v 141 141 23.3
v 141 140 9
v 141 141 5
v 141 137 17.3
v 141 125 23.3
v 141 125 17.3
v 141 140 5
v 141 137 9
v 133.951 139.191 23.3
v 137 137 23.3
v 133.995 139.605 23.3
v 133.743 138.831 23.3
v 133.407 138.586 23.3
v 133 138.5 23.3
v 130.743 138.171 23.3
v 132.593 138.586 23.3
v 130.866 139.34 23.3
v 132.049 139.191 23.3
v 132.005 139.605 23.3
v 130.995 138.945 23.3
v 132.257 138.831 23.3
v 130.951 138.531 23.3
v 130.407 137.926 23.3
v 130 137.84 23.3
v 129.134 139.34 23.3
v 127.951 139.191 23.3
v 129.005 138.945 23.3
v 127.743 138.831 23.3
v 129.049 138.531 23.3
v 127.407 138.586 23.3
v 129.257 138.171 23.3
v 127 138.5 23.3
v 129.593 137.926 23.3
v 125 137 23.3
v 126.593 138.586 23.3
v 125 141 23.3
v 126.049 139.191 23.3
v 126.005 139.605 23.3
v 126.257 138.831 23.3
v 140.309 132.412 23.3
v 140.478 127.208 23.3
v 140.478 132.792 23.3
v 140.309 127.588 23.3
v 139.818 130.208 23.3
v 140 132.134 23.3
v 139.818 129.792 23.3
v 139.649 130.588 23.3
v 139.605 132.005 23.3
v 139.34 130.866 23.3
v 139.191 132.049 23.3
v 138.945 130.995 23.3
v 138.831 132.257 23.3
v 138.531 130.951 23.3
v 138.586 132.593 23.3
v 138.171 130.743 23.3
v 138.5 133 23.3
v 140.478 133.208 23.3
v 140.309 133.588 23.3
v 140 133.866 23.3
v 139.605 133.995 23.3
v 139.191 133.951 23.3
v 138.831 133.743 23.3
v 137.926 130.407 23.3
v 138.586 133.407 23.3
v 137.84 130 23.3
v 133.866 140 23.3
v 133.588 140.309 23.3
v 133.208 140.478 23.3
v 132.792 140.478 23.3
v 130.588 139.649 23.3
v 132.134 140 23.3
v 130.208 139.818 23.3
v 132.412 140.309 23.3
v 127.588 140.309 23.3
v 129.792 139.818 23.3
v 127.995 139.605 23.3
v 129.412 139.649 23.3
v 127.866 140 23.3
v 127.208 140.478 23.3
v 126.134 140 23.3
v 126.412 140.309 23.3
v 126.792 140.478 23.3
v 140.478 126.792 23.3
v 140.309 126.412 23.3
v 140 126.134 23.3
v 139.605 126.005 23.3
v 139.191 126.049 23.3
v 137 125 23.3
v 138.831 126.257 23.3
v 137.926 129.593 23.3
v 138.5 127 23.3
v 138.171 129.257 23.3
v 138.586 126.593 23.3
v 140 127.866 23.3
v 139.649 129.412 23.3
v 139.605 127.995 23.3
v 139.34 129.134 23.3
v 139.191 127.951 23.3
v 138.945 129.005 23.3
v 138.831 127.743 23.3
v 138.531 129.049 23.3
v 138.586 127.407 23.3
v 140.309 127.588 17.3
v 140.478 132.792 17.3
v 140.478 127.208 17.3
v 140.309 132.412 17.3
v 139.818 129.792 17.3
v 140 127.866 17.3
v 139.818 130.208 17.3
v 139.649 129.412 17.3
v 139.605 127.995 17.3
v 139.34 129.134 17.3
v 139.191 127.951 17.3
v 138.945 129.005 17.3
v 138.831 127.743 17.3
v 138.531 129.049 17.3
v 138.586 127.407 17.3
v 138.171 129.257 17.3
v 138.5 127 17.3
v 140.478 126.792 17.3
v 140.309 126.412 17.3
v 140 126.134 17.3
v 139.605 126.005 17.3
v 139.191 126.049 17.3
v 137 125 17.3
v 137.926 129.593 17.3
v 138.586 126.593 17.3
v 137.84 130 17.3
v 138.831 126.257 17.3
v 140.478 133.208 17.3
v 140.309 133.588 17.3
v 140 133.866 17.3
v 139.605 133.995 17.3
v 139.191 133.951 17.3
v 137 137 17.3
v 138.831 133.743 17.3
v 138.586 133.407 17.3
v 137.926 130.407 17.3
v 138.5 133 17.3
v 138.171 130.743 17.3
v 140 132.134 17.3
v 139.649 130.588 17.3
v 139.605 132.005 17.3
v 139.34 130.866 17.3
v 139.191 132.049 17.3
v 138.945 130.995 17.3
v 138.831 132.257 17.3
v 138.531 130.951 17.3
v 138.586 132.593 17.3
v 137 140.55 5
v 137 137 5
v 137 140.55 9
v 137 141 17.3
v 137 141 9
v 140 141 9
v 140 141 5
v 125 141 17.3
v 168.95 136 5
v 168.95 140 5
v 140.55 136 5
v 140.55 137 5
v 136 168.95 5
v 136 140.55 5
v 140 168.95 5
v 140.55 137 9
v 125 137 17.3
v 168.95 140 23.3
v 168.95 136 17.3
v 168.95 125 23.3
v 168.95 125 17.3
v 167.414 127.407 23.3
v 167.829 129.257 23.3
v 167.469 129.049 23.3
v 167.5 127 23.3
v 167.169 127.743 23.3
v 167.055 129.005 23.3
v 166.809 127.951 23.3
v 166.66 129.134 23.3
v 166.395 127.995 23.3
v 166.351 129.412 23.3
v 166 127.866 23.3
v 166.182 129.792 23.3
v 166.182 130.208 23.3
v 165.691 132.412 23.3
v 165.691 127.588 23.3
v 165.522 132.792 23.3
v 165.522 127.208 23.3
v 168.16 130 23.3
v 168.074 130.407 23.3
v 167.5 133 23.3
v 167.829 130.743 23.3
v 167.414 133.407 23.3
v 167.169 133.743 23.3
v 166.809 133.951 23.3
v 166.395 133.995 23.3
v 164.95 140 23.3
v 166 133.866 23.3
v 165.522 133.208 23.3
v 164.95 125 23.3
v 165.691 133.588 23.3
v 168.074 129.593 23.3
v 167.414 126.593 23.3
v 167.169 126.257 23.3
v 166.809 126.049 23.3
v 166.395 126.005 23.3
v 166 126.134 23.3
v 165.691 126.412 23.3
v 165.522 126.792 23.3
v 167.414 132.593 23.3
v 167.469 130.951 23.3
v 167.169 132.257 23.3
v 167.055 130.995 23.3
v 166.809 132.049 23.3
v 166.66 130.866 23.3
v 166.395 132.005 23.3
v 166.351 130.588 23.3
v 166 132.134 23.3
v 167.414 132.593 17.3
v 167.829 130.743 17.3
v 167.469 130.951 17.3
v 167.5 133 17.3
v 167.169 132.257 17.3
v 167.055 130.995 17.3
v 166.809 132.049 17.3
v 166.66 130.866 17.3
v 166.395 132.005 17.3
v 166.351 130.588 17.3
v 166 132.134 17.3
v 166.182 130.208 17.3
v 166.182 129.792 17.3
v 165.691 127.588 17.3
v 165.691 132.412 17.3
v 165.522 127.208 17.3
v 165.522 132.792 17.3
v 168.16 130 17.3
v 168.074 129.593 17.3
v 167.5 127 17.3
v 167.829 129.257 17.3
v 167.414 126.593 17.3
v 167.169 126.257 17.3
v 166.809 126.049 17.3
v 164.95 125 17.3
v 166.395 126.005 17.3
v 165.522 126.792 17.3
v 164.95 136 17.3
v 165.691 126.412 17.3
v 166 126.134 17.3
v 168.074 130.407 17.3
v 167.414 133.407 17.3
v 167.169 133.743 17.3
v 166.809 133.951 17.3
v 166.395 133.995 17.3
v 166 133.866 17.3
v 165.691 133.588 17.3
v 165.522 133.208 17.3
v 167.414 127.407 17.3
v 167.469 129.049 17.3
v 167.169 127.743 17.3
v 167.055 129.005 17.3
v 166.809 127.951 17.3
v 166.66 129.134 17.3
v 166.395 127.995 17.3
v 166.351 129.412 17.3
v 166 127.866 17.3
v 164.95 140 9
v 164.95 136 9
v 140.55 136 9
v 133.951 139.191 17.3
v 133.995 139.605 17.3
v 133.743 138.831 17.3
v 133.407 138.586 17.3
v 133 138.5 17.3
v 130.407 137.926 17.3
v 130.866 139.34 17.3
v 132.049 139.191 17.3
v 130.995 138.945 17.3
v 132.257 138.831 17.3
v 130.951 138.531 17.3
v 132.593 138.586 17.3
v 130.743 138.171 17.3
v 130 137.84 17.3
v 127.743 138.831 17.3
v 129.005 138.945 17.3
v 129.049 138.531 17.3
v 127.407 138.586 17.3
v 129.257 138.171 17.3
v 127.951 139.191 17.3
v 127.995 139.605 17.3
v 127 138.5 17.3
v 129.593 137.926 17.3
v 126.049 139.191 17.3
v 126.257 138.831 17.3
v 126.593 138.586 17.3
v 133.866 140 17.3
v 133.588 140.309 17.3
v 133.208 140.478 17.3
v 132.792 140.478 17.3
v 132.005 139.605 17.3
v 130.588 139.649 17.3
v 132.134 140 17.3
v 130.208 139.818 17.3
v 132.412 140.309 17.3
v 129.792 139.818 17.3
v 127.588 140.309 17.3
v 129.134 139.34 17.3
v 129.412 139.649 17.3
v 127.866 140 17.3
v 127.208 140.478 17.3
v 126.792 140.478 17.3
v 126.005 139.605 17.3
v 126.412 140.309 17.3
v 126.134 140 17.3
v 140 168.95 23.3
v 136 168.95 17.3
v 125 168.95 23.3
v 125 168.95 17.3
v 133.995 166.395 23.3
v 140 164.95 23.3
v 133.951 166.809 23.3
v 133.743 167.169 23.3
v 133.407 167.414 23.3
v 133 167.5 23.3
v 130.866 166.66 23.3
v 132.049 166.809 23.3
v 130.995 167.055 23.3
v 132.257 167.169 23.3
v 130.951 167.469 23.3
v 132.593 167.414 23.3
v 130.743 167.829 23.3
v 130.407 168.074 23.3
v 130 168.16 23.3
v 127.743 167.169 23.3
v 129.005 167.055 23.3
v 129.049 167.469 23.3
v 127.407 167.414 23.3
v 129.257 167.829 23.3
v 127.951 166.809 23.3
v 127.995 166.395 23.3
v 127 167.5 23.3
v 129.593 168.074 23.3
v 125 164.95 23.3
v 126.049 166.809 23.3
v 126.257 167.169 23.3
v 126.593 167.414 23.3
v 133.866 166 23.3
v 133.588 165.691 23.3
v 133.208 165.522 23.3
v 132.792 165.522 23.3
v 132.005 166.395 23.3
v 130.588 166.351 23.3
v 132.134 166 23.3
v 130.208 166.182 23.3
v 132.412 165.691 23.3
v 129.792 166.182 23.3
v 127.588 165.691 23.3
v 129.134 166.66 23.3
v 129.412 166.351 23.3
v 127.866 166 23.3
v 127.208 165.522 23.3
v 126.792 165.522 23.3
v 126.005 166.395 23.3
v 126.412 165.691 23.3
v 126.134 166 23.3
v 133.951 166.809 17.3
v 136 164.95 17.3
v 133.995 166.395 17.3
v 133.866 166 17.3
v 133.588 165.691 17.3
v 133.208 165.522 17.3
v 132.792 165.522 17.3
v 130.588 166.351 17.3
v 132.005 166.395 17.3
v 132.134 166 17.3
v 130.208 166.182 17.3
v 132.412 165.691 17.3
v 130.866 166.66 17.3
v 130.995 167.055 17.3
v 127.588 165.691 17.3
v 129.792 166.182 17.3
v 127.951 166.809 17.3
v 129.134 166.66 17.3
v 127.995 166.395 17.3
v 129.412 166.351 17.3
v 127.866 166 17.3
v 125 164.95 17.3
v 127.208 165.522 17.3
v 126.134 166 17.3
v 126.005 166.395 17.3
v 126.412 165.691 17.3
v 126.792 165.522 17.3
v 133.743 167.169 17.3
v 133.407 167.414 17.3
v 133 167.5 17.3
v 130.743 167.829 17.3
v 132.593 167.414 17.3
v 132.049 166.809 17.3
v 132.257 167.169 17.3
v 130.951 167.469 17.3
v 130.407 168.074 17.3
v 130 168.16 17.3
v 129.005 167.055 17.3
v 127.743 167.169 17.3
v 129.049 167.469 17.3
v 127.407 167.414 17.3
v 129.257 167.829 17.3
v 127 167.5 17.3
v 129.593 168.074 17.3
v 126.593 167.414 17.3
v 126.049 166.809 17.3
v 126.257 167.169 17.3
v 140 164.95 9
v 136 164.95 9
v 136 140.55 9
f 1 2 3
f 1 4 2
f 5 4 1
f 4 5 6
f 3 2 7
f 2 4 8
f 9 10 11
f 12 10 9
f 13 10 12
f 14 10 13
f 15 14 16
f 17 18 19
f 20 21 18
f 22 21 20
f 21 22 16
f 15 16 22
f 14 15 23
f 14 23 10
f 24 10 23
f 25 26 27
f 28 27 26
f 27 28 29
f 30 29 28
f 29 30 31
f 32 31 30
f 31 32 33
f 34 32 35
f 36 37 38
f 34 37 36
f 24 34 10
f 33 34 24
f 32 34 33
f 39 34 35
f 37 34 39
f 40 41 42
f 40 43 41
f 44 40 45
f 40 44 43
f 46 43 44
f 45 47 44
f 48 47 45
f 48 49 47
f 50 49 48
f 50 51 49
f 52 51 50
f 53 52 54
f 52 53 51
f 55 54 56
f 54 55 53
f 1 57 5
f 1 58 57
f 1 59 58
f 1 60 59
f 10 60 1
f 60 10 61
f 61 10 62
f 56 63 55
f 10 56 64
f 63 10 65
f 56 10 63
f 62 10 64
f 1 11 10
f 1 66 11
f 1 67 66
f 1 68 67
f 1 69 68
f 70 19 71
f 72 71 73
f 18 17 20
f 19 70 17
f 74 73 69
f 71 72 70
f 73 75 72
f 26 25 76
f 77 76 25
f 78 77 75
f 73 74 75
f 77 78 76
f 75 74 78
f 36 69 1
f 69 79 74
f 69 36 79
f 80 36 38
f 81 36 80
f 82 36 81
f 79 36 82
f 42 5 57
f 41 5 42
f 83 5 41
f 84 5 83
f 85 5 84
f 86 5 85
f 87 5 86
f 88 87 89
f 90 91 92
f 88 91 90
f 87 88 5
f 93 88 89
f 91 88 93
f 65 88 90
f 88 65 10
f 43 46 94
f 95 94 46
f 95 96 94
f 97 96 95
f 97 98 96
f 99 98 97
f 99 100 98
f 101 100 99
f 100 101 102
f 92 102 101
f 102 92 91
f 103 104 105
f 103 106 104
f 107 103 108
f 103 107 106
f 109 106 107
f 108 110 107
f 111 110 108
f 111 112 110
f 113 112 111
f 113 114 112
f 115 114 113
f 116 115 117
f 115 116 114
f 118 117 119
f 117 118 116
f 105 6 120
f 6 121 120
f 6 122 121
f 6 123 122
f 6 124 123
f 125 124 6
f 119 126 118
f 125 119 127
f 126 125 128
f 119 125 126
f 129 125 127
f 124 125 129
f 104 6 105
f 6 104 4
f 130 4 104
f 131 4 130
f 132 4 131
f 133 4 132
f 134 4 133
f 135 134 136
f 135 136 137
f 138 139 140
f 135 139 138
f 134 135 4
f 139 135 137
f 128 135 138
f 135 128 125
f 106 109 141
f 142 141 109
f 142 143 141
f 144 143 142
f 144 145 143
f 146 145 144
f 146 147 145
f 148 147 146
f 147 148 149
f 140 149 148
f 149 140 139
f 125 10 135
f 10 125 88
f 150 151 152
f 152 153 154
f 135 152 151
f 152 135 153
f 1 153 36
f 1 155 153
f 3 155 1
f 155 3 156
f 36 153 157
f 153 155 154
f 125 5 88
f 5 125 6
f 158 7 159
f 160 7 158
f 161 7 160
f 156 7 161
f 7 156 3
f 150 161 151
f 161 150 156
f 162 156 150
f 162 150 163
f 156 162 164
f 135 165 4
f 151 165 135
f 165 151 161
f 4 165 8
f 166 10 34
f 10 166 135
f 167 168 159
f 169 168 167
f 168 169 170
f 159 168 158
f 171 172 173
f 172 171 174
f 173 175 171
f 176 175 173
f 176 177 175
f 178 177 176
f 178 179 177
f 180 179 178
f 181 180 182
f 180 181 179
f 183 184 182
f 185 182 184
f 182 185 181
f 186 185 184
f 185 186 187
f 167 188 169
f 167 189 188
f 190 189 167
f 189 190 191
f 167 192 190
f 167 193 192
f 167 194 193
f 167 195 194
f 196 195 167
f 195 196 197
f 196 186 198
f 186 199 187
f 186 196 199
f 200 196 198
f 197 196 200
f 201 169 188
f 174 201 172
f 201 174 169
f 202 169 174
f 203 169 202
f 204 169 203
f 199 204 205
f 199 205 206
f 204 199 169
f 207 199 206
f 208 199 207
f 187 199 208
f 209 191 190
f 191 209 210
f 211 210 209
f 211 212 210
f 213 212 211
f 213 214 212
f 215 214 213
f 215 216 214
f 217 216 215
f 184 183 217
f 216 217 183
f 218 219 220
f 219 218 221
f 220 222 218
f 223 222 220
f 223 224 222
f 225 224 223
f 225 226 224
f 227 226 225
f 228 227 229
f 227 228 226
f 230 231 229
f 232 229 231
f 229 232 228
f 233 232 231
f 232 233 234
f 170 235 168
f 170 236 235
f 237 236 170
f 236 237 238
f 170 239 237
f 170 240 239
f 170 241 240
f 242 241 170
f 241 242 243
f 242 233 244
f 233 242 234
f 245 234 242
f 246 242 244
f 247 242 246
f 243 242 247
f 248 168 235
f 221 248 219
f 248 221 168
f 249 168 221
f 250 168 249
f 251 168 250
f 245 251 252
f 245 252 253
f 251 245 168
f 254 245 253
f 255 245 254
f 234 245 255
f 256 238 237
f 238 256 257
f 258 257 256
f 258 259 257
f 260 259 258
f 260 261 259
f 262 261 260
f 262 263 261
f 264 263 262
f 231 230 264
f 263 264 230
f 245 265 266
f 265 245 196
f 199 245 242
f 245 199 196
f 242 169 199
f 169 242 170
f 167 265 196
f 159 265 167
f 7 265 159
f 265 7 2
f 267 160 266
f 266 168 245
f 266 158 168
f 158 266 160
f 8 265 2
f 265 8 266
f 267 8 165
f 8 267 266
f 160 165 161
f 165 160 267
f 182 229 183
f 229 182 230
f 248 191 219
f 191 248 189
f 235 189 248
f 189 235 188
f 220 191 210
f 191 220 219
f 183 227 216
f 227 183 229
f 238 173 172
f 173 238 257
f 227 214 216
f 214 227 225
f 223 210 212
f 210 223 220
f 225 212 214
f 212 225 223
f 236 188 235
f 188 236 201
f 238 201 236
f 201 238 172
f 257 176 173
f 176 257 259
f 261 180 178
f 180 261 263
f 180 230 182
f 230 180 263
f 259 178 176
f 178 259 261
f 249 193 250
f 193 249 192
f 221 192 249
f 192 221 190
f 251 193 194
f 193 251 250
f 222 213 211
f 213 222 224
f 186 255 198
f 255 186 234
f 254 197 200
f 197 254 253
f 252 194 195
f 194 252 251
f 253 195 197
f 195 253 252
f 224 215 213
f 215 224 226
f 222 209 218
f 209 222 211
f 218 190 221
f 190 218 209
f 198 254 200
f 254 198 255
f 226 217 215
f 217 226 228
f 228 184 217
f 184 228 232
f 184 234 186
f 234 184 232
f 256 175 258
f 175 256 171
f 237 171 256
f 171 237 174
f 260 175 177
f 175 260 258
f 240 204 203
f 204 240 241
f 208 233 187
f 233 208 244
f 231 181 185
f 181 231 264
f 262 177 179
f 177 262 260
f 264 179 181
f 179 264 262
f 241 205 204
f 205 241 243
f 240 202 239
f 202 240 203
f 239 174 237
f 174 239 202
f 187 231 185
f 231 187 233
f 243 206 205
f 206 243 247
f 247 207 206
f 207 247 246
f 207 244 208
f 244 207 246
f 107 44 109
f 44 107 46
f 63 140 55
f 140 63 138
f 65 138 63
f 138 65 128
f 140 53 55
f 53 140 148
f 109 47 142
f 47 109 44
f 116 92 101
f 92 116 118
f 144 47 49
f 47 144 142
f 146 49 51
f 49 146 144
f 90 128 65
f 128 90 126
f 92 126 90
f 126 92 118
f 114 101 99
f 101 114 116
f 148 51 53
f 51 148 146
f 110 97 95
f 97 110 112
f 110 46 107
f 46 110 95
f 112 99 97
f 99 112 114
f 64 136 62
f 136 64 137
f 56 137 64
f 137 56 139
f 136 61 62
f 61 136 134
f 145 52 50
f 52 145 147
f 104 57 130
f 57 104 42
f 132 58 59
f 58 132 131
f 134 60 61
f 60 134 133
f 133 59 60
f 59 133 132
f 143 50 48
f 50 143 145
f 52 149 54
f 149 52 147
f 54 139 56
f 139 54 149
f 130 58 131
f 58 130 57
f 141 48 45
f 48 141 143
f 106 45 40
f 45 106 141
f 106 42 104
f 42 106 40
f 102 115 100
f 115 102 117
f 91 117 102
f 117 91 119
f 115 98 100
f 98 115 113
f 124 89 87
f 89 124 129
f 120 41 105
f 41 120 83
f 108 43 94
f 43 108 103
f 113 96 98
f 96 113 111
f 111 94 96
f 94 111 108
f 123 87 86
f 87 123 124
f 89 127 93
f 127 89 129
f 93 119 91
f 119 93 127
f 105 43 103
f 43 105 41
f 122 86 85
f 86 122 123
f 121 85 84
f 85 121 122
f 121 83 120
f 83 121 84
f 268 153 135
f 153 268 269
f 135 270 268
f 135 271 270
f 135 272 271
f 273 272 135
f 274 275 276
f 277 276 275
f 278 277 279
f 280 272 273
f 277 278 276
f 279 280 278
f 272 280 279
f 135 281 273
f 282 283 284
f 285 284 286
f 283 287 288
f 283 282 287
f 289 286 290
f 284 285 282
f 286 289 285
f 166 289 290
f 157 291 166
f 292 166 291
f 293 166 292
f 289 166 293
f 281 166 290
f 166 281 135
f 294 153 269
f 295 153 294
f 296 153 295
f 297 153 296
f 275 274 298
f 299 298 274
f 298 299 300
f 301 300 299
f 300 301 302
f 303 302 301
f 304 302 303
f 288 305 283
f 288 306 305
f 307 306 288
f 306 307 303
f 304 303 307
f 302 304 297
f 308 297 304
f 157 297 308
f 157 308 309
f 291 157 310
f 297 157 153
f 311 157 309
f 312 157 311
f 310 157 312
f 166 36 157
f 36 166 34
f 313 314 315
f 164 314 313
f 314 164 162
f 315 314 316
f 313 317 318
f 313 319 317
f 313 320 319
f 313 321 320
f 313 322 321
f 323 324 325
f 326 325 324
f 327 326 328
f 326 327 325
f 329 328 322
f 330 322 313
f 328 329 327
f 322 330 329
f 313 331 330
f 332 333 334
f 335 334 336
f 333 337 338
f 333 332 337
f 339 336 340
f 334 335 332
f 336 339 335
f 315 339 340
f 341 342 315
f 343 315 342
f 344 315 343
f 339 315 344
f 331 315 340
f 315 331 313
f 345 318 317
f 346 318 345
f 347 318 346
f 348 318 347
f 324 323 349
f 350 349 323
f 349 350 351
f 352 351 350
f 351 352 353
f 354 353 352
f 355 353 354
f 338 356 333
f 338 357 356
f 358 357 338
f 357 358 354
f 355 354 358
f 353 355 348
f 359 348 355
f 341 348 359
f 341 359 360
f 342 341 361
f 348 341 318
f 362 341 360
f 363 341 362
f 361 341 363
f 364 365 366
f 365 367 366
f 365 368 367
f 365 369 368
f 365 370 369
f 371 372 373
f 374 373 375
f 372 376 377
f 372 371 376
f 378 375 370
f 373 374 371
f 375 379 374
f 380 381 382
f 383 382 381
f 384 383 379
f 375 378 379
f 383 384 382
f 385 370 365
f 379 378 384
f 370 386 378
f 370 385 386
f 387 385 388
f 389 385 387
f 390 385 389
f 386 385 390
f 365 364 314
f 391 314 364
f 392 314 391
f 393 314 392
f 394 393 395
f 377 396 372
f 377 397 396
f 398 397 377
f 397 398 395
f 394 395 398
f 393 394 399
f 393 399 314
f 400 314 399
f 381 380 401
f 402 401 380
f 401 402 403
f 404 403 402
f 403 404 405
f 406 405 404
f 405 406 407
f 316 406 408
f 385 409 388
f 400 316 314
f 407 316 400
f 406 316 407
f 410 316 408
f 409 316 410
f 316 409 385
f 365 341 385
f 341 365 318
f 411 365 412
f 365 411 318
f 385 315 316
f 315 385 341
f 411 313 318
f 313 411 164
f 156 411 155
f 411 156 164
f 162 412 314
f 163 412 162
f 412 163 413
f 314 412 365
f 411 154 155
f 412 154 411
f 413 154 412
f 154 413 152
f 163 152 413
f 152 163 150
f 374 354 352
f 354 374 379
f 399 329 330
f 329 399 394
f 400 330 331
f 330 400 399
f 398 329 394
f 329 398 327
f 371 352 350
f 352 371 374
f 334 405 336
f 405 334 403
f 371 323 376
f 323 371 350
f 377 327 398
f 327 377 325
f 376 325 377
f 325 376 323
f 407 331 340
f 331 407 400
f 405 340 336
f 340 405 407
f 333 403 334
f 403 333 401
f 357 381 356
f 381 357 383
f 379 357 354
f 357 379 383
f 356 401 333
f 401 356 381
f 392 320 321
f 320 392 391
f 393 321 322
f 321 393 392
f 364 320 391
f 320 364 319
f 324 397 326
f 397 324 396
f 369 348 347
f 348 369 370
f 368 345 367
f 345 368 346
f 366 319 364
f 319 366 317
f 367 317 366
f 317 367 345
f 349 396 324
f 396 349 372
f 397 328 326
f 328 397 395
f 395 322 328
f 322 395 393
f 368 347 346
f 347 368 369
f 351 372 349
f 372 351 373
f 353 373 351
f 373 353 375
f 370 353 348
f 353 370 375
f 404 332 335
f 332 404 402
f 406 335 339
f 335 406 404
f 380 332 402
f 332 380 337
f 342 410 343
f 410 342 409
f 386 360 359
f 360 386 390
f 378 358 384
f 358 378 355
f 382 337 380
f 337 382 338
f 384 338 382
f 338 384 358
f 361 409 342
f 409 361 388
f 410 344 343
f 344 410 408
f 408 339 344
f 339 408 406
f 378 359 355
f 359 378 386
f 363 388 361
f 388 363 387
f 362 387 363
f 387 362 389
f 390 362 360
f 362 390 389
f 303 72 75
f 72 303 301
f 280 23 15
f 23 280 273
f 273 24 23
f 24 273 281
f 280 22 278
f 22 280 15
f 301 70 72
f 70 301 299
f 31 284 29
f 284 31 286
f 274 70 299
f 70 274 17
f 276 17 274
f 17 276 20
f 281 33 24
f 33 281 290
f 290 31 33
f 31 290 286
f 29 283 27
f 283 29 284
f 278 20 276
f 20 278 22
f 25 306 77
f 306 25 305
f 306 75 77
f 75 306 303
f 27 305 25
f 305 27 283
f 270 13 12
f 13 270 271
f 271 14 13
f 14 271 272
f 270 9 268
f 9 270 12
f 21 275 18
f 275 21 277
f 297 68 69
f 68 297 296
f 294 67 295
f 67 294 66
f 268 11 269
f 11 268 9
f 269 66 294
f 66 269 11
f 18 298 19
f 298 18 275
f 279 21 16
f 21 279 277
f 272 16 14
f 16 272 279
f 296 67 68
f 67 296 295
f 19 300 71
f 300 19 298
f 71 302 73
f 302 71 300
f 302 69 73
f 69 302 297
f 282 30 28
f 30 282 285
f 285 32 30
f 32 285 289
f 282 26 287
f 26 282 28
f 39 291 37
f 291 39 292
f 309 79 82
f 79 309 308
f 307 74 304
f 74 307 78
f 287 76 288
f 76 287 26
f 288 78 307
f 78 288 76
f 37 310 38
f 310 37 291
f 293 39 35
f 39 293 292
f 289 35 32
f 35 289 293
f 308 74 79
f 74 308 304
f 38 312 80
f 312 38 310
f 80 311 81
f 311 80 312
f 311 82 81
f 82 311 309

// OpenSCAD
// file: ../motors/MN5212.scad
use <../utils.scad>

module MN5212(){

	//render(){
		difference(){
			union(){
				translate([0,0, 42.5 / 2 - 23 / 2 - 4.9 - 6])
					cylinder(
						h = 23,
						r = 59 / 2,
						$fa = fa(59 / 2),
						center = true);
				translate([0,0, 42.5 / 2 - 4.9 / 2 - 6])
					cylinder(
						h = 4.9,
						r1 = 59 / 2,
						r2 = 24.8 / 2,
						$fa = fa(59 / 2),
						center = true);
				translate([0,0, - 42.5 / 2 + 5.6 / 2 + 3])
					cylinder(
						h = 5.6,
						r1 = 44 / 2,
						r2 = 59 / 2,
						$fa = fa(59 / 2),
						center = true);
				translate([0, 0, 42.5 / 2 - 3])
					cylinder(
						h = 6,
						r = 4 / 2,
						$fa = fa(4 / 2),
						center = true);
				translate([0, 0, - 42.5 / 2 + 1.5])
					cylinder(
						h = 3,
						r = 6 / 2,
						$fa = fa(6 / 2),
						center = true);
			}
			union(){
				for(i = [0:90:270])
					rotate([0, 0, i])
						translate([0, 25 / 2, -16.25 - 0.025])
							cylinder(
								h = 4,
								r = 3 / 2,
								$fa = fa(3 / 2),
								center = true);
				for(i = [0:120:240])
					rotate([0, 0, i])
						translate([0, 17 / 2, 12.75 + 0.025])
							cylinder(
								h = 5,
								r = 3 / 2,
								$fa = fa(3 / 2),
								center = true);
				rotate([0, 0, 30])
					translate([0, 12 / 2, 12.75 + 0.025])
						cylinder(
							h = 5,
							r = 3 / 2,
							$fa = fa(3 / 2),
							center = true);
				rotate([0, 0, 30 + 180])
					translate([0, 12 / 2, 12.75 + 0.025])
						cylinder(
							h = 5,
							r = 3 / 2,
							$fa = fa(3 / 2),
							center = true);
			}
		}

	//}

}

MN5212();
// file: ../servos/TGY_4805_2PA.scad
use <../utils.scad>

module TGY_4805_2PA(){

	length = 40;
	width = 20;
	depth = 36.4;
	wing_width = 58;
	wing_thick = 2.45;
	wing_height = 27.7;
	shaft_offset = 9.5;
	hole_seperation = 9.2;
	hole_spacing = 50;
	shaft_height = 40;
	shaft_length = 3.6;
	hole_diameter = 4.8;

	module mounting_hole(){
		mh_rad = hole_diameter / 2;
		translate(
			[
				hole_spacing / 2,
				0,
				-depth / 2 + wing_height - wing_thick / 2
			])
			cylinder(h = 5, r = mh_rad, $fa = fa(mh_rad), center = true);
	}

	difference(){
		union(){
			cube([length, width, depth], center = true);
			translate([0, 0, -depth / 2 + wing_height - wing_thick / 2])
				cube([wing_width, width, wing_thick], center = true);
			translate(
				[
					- length / 2 + shaft_offset,
					0,
					shaft_height - length / 2 + shaft_length / 2
				])
				cylinder(
					h = shaft_length,
					r = 1.5,
					$fa = fa(1.5),
					center = true);
		}	union(){

			translate([0, hole_seperation / 2, 0]){
				mounting_hole();
				mirror() mounting_hole();
			}
			translate([0, -hole_seperation / 2, 0]){
				mounting_hole();
				mirror() mounting_hole();
			}
		}
	}
}

module TGY_4805_2PA_translate(){
	length = 40;
	shaft_offset = 9.5;
	shaft_height = 40;
	shaft_length = 3.6;
	translate(
		[
				- length / 2 + shaft_offset,
				0,
				shaft_height - length / 2 + shaft_length / 2
		]) children();
}

TGY_4805_2PA();
// file: ../servos/HS_5065MG.scad
use <../utils.scad>

module HS_5065MG(){

	length = 23.75;
	width = 11.68;
	depth = 20.32;
	wing_width = 32.38;
	wing_thick = 2;
	wing_offset = 1;
	shaft_offset = 6;
	hole_spacing = 28.32;
	hole_spacing_2 = 27;
	hole_2_wide = 6;
	hole_diameter = 2;
	shaft_height = 26.16;
	shaft_length = 2;

	module mounting_hole(){
		mh_rad = hole_diameter / 2;
		translate(
			[
				hole_spacing / 2,
				0,
				depth / 2 - wing_thick / 2
			])
			cylinder(h = 5, r = mh_rad, $fa = fa(mh_rad), center = true);
		translate(
			[
				hole_spacing_2 / 2,
				hole_2_wide / 2,
				depth / 2 - wing_thick / 2
			])
			cylinder(h = 5, r = mh_rad, $fa = fa(mh_rad), center = true);
		translate(
			[
				hole_spacing_2 / 2,
				- hole_2_wide / 2,
				depth / 2 - wing_thick / 2
			])
			cylinder(h = 5, r = mh_rad, $fa = fa(mh_rad), center = true);
	}

	difference(){
		union(){
			cube([length, width, depth], center = true);
			translate([0, 0, depth / 2 - wing_thick / 2 - wing_offset])
				cube([wing_width, width, wing_thick], center = true);
			translate(
				[
					- length / 2 + shaft_offset,
					0,
					depth / 2 + 3.8 + 1.9 + shaft_length / 2
				])
				cylinder(
					h = shaft_length,
					r = 1.5,
					$fa = fa(1.5),
					center = true);
			translate(
				[
					- length / 2 + shaft_offset,
					0,
					depth / 2 + 3.8 / 2
				])
				cylinder(
					h = 3.8,
					r = 11.3 / 2,
					$fa = fa(11.3 / 2),
					center = true);
			translate(
				[
					- length / 2 + shaft_offset,
					0,
					depth / 2 + 3.8 + 1.9 / 2
				])
				cylinder(
					h = 1.9,
					r1 = 11.3 / 2,
					r2 = 8 / 2,
					$fa = fa(11.3 / 2),
					center = true);
		}	union(){

			mounting_hole();
			mirror() mounting_hole();
		}
	}
}

module HS_5065MG_arm(){

	hole_size = 1.5;
	hole_spacing = 3;
	hole_offset = 9.6;

	difference(){
		union(){
			translate([0, 0, 4.4 / 2])
				cylinder(
					h = 4.4,
					r = 8 / 2,
					$fa = fa(8 / 2),
					center = true);
			hull(){
				translate([0, 0, 4.4 - 1.8 / 2])
					cylinder(
						h = 1.8,
						r = 8 / 2,
						$fa = fa(8 / 2),
						center = true);
				translate([18.8, 0, 4.4 - 1.8 / 2])
					cylinder(
						h = 1.8,
						r = 5 / 2,
						$fa = fa(5 / 2),
						center = true);
			}
		}
		union(){
			for(i = [0:3]){
				translate([hole_offset + hole_spacing * i, 0, 4.4 - 1.8 / 2])
					cylinder(
						h = 5,
						r = hole_size / 2,
						$fa = fa(hole_size / 2),
						center = true);
			}
		}
	}
}

module HS_5065MG_shaft_translate(){
	translate(
		[
			- 23.75 / 2 + 6,
			0,
			20.32 / 2 + 3.8 + 1.9
		])
			children();
}

HS_5065MG();
HS_5065MG_shaft_translate() HS_5065MG_arm();
// file: ../servos/LS_0006_servo.scad
// Author Michael Marques (DrYerzinia)

use <../utils.scad>

module ls_0006_servo(){
	
	length = 21.4;
	depth = 19.9;
	thickness = 11.65;

	gear_height = 2.6;
	gear_bump_height = 0.7;
	gear_bump_diameter = 1.97;
	gear_outer_bump_diameter = 6;
	gear_bump_offset = 12.2;

	shaft_height = 2.4;
	shaft_diameter = 3.74;
	shaft_offset = thickness / 2;
	shaft_screw_diameter = 1.3;
	
	wing_outer_width = 8.5;
	wing_top_off = 3.8;
	wing_length = 3.8;
	wing_thickness = 1.2;
	wing_hole_diameter = 1.85;
	wing_hole_edge_dist = 2;

	module wing_hole(){
		translate(
			[
				length / 2 + wing_hole_edge_dist,
				0,
				depth/2 - wing_top_off - wing_thickness / 2
			])
			cylinder(
				h = wing_thickness + 1,
				r = wing_hole_diameter / 2,
				$fn = 16,
				center = true);
	}

	module wing(){
		translate(
			[
				length / 2,
				thickness / 2,
				depth/2 - wing_top_off - wing_thickness
			])
			rotate([0,0,-90])
				trapezoid(
					thickness,
					wing_outer_width,
					wing_length,
					wing_thickness);
	}

	// Body
	cube([length, thickness, depth], center = true);

	difference(){
		union(){

			wing();
			mirror() wing();

			// Gear Bumps
			translate([0, 0, depth/2 + gear_height / 2]){
				translate([length / 2 - gear_bump_offset, 0, 0])
					cylinder(
						h = gear_height,
						r = gear_outer_bump_diameter / 2,
						$fn = 16,
						center = true);
				translate([length / 2 - gear_bump_offset, 0, gear_height/2 + gear_bump_height / 2])
					cylinder(
						h = gear_bump_height,
						r = gear_bump_diameter / 2,
						$fn = 16,
						center = true);
				translate([length / 2 - shaft_offset, 0, 0])
					cylinder(
						h = gear_height,
						r = thickness / 2,
						$fn = 32,
						center = true);
				// Shaft
				translate([length / 2 - shaft_offset, 0, gear_height])
					cylinder(
						h = shaft_height,
						r = shaft_diameter / 2,
						$fn = 16,
						center = true);
			}

		}
		union(){

			wing_hole();
			mirror() wing_hole();

			// Shaft_hole
			translate(
				[
					length / 2 - shaft_offset,
					0,
					depth/2 + gear_height * (3 / 2) + 0.5])
				cylinder(
					h = shaft_height + 1,
					r = shaft_screw_diameter / 2,
					$fn = 16,
					center = true);

		}
	}

}

module translate_ls_0006_attachment(){

	length = 21.4;
	thickness = 11.65;
	shaft_offset = thickness / 2;
	depth = 19.9;
	float = 3.3;

	translate([length / 2 - shaft_offset, 0, depth / 2 + float])
		children();

}

module bar_attachment(){

	height = 3.75;
	bar_length = 14.7;
	bar_thickness = 1.6;
	inner_radius = 5.9;
	outer_radius = 3.95;
	shaft_diameter = 3.7;
	upper_void_diameter = 4.8;
	screw_diameter = 2;
	hole_spacing = 2;
	hole_4_diameter = 1.2;
	hole_diameter = 1;
	hole_start_off = 4.7;
	top_void_depth = 0.67;
	bottom_void_depth = 1.84;

	translate([0, 0, height / 2]){
		difference(){
			union(){

				translate([0, inner_radius / 2, height / 2 - bar_thickness])
					rotate([0,0,-90])
						trapezoid(
							inner_radius,
							outer_radius,
							bar_length,
							bar_thickness);

				cylinder(
					h = height,
					r = inner_radius / 2,
					$fn = 16,
					center = true);

				translate([bar_length, 0, height / 2 - bar_thickness / 2])
					cylinder(
						h = bar_thickness,
						r = outer_radius / 2,
						$fn = 16,
						center = true);

			}
			union(){
				// screwhole
				cylinder(
					h = height + 1,
					r = screw_diameter / 2,
					$fn = 16,
					center = true);
				// voids
				translate([0, 0, height / 2 - top_void_depth / 2 + 0.5])
					cylinder(
						h = top_void_depth + 1,
						r = upper_void_diameter / 2,
						$fn = 16,
						center = true);
				translate([0, 0,  - bottom_void_depth / 2 - 0.5])
					cylinder(
						h = bottom_void_depth + 1,
						r = shaft_diameter / 2,
						$fn = 16,
						center = true);

				for(i = [0:4]){
					dia = (i != 3) ? hole_diameter : hole_4_diameter;
					translate(
						[
							hole_start_off + hole_spacing * i,
							0,
							height / 2 - bar_thickness / 2])
						cylinder(
							h = bar_thickness + 1,
							r = dia / 2,
							$fn = 16,
							center = true);
				}

			}
		}
	}

}

ls_0006_servo();
translate_ls_0006_attachment() bar_attachment();
// file: ../servos/parallax_continuous_rotation_servo.scad
// Author Michael Marques (DrYerzinia)

module parallax_continuous_rotation_servo(){

	depth = 37.7;
	length = 40.75;
	width = 19.75;

	mount_height = 2.7;
	mount_extent = 6.1;
	mount_from_top = 7.7;

	mount_hole_diameter = 4.46;
	mount_hole_spacing = 14.4 - mount_hole_diameter;

	shaft_diameter = 5.8;
	shaft_offset = 10;
	shaft_length = 3.5;

	module mounting_hole(){

			translate(
				[
					length / 2 + 5,
					mount_hole_spacing / 2,
					depth / 2 - mount_height / 2 - mount_from_top
				]
				)
				cylinder(
					h = mount_height + 1,
					r = mount_hole_diameter / 2,
					$fn=16,
					center = true);
	}

	difference(){
		union(){

			// Body
			cube([length,width,depth], center = true);

			// Mounting wings
			translate(
				[
					0,
					0,
					depth / 2 - mount_height / 2 - mount_from_top
				])
				cube(
					[
						length + mount_extent * 2,
						width,
						mount_height
					],
					center = true);

			// Shaft
			translate(
				[
					length / 2 - shaft_offset,
					0,
					depth / 2 + shaft_length / 2
				]
				)
				cylinder(
					h = shaft_length,
					r = shaft_diameter / 2,
					$fn = 16,
					center = true
				);

		}
		union(){

			// Mounting Holes
			mounting_hole();
			mirror()
				mounting_hole();

			translate([0,-mount_hole_spacing,0]){
				mounting_hole();
				mirror()
					mounting_hole();
			}
		}
	}

}

module translate_shaft(){

	depth = 37.7;
	length = 40.75;

	shaft_offset = 10;

	translate(
		[
			length / 2 - shaft_offset,
			0,
			depth / 2
		])
		children();
}

module round_servo_attachment(){

	height = 6;
	diameter = 20.8;
	inner_diameter = 8.6;
	plate_thickness = 2.45;

	float = 2;

	depth = 37.7;
	length = 40.75;

	shaft_offset = 10;

	plate_hole_spacing = 14.5;
	plate_hole_diameter = 1.4;
	plate_hole_minor_spacing = 3.5;

	screw_hole_diameter = 3;

	inner_diameter = 8;
	
	top_depth = 1.8;
	bottom_depth = 3.4;

	void_diameter = 5.8;

	module plate_hole(){
		cylinder(
			h = plate_thickness + 1,
			r = plate_hole_diameter / 2,
			$fn = 16,
			center = true
		);
	}

	module plate_hole_group(){
		translate([0, 0, height / 2 - plate_thickness / 2]){
			translate([0, plate_hole_spacing / 2, 0]){
					plate_hole();
					translate([- plate_hole_minor_spacing, 0, 0])
						plate_hole();
					translate([  plate_hole_minor_spacing, 0, 0])
						plate_hole();
			}
		}
	}

	translate(
		[
			length / 2 - shaft_offset,
			0,
			depth / 2 + height / 2 + float
		]
		)
		difference(){

			union(){

				// inner shaft
				cylinder(
					h = height,
					r = inner_diameter / 2,
					$fn = 16,
					center = true
				);

				// top
				translate([0, 0, height / 2 - plate_thickness / 2])
					cylinder(
						h = plate_thickness,
						r = diameter / 2,
						$fn = 32,
						center = true
					);
			}

			union(){

				// plate holes
				for(ang = [0:3]){
					rotate([0,0, ang * 90])
						plate_hole_group();
				}

				// screw hole
				cylinder(
					h = height + 1,
					r = screw_hole_diameter / 2,
					$fn = 16,
					center = true
				);

				// inner voids
				translate([0, 0, height / 2 - top_depth / 2 + 1])
					cylinder(
						h = top_depth + 1,
						r = void_diameter / 2,
						$fn = 16,
						center = true
					);
				translate([0, 0, -1])
					cylinder(
						h = bottom_depth + 1,
						r = void_diameter / 2,
						$fn = 16,
						center = true
					);

			}

		}

}

parallax_continuous_rotation_servo();
round_servo_attachment();
// file: ../hardware.scad
 // Author Michael Marques (DrYerzinia)

// http://www.ebay.com/itm/10-PCS-683-3x7x2-mm-Metal-OPEN-PRECISION-Miniature-Ball-Bearing-3-7-2-/291206307942?hash=item43cd3fa066:m:mCi6eovrGVk_CjIUjlhw8yg
// E-Bay empire.rc

module washer_M3_7x3_2x0_5mm(){

	difference(){
		cylinder(
			h = 0.5,
			r = 7 / 2,
			$fn = 16,
			center = true);
		cylinder(
			h = 0.5 + 0.1,
			r = 3.2 / 2,
			$fn = 16,
			center = true);
	}

}

module bearing_3x7x2mm(){

	difference(){
		cylinder(
			h = 2,
			r = 7 / 2,
			$fn = 16,
			center = true);
		cylinder(
			h = 2 + 1,
			r = 3 / 2,
			$fn = 16,
			center = true);
	}

}

module bearing_5x8x2_5mm(){

	difference(){
		cylinder(
			h = 2.5,
			r = 8 / 2,
			$fn = 16,
			center = true);
		cylinder(
			h = 2.5 + 1,
			r = 5 / 2,
			$fn = 16,
			center = true);
	}

}

module bearing_8x16x5mm(){

	difference(){
		cylinder(
			h = 5,
			r = 16 / 2,
			$fn = 16,
			center = true);
		cylinder(
			h = 5 + 1,
			r = 8 / 2,
			$fn = 16,
			center = true);
	}

}


bearing_5x8x2_5mm();
// file: ../utils.scad
// http://forum.openscad.org/Creating-pie-pizza-slice-shape-need-a-dynamic-length-array-td3148.html

module pie_slice(r, start_angle, end_angle) {
    R = r * sqrt(2) + 1;
    a0 = (4 * start_angle + 0 * end_angle) / 4;
    a1 = (3 * start_angle + 1 * end_angle) / 4;
    a2 = (2 * start_angle + 2 * end_angle) / 4;
    a3 = (1 * start_angle + 3 * end_angle) / 4;
    a4 = (0 * start_angle + 4 * end_angle) / 4;
    if(end_angle > start_angle)
        intersection() {
        circle(r, $fa = fa(r));
        polygon([
            [0,0],
            [R * cos(a0), R * sin(a0)],
            [R * cos(a1), R * sin(a1)],
            [R * cos(a2), R * sin(a2)],
            [R * cos(a3), R * sin(a3)],
            [R * cos(a4), R * sin(a4)],
            [0,0]
       ]);
    }
}

// https://github.com/openscad/openscad/issues/29

module rotate_about(v,a) {
	translate(v) rotate(a) translate(-v) children();
}

module rotate_about_axis(v, ang, axis) {
	translate(v) rotate(ang, axis) translate(-v) children();
}

// https://github.com/robofun/openscad-utils/blob/master/trapezoid.scad

module trapezoid(width_base, width_top, height, thickness){
	

  linear_extrude(height = thickness)
		polygon(
			points =
				[
					[0,0],
					[width_base,0],
					[width_base-(width_base-width_top)/2,height],
					[(width_base-width_top)/2,height]
				],
				paths=[[0,1,2,3]]); 
  
}

// http://forum.openscad.org/fe-Tolerance-based-arc-approximation-td14212.html

function fa(r)=($fn>0)?360/$fn:($fe>0)?($fe<r)?min(45,2*acos(1-$fe/r)):45:$fa; 
// file: ../render_settings.scad
// Author Michael Marques (DrYerzinia)

// Lulzbot Mini tolerances
// x/y 0.1mm
// z   0.05mm
//
// 0.1mm   preview tolerance
// 0.025mm export  tolerance

$fs = 0.01;
$fn = undef;
$fa = 360 / 5;

$fe = 0.025;	// export
// main file
// Author Michael Marques (DrYerzinia)

include <../render_settings.scad>

use <../BB8.scad>

Body_P16_door_servo_mount();
